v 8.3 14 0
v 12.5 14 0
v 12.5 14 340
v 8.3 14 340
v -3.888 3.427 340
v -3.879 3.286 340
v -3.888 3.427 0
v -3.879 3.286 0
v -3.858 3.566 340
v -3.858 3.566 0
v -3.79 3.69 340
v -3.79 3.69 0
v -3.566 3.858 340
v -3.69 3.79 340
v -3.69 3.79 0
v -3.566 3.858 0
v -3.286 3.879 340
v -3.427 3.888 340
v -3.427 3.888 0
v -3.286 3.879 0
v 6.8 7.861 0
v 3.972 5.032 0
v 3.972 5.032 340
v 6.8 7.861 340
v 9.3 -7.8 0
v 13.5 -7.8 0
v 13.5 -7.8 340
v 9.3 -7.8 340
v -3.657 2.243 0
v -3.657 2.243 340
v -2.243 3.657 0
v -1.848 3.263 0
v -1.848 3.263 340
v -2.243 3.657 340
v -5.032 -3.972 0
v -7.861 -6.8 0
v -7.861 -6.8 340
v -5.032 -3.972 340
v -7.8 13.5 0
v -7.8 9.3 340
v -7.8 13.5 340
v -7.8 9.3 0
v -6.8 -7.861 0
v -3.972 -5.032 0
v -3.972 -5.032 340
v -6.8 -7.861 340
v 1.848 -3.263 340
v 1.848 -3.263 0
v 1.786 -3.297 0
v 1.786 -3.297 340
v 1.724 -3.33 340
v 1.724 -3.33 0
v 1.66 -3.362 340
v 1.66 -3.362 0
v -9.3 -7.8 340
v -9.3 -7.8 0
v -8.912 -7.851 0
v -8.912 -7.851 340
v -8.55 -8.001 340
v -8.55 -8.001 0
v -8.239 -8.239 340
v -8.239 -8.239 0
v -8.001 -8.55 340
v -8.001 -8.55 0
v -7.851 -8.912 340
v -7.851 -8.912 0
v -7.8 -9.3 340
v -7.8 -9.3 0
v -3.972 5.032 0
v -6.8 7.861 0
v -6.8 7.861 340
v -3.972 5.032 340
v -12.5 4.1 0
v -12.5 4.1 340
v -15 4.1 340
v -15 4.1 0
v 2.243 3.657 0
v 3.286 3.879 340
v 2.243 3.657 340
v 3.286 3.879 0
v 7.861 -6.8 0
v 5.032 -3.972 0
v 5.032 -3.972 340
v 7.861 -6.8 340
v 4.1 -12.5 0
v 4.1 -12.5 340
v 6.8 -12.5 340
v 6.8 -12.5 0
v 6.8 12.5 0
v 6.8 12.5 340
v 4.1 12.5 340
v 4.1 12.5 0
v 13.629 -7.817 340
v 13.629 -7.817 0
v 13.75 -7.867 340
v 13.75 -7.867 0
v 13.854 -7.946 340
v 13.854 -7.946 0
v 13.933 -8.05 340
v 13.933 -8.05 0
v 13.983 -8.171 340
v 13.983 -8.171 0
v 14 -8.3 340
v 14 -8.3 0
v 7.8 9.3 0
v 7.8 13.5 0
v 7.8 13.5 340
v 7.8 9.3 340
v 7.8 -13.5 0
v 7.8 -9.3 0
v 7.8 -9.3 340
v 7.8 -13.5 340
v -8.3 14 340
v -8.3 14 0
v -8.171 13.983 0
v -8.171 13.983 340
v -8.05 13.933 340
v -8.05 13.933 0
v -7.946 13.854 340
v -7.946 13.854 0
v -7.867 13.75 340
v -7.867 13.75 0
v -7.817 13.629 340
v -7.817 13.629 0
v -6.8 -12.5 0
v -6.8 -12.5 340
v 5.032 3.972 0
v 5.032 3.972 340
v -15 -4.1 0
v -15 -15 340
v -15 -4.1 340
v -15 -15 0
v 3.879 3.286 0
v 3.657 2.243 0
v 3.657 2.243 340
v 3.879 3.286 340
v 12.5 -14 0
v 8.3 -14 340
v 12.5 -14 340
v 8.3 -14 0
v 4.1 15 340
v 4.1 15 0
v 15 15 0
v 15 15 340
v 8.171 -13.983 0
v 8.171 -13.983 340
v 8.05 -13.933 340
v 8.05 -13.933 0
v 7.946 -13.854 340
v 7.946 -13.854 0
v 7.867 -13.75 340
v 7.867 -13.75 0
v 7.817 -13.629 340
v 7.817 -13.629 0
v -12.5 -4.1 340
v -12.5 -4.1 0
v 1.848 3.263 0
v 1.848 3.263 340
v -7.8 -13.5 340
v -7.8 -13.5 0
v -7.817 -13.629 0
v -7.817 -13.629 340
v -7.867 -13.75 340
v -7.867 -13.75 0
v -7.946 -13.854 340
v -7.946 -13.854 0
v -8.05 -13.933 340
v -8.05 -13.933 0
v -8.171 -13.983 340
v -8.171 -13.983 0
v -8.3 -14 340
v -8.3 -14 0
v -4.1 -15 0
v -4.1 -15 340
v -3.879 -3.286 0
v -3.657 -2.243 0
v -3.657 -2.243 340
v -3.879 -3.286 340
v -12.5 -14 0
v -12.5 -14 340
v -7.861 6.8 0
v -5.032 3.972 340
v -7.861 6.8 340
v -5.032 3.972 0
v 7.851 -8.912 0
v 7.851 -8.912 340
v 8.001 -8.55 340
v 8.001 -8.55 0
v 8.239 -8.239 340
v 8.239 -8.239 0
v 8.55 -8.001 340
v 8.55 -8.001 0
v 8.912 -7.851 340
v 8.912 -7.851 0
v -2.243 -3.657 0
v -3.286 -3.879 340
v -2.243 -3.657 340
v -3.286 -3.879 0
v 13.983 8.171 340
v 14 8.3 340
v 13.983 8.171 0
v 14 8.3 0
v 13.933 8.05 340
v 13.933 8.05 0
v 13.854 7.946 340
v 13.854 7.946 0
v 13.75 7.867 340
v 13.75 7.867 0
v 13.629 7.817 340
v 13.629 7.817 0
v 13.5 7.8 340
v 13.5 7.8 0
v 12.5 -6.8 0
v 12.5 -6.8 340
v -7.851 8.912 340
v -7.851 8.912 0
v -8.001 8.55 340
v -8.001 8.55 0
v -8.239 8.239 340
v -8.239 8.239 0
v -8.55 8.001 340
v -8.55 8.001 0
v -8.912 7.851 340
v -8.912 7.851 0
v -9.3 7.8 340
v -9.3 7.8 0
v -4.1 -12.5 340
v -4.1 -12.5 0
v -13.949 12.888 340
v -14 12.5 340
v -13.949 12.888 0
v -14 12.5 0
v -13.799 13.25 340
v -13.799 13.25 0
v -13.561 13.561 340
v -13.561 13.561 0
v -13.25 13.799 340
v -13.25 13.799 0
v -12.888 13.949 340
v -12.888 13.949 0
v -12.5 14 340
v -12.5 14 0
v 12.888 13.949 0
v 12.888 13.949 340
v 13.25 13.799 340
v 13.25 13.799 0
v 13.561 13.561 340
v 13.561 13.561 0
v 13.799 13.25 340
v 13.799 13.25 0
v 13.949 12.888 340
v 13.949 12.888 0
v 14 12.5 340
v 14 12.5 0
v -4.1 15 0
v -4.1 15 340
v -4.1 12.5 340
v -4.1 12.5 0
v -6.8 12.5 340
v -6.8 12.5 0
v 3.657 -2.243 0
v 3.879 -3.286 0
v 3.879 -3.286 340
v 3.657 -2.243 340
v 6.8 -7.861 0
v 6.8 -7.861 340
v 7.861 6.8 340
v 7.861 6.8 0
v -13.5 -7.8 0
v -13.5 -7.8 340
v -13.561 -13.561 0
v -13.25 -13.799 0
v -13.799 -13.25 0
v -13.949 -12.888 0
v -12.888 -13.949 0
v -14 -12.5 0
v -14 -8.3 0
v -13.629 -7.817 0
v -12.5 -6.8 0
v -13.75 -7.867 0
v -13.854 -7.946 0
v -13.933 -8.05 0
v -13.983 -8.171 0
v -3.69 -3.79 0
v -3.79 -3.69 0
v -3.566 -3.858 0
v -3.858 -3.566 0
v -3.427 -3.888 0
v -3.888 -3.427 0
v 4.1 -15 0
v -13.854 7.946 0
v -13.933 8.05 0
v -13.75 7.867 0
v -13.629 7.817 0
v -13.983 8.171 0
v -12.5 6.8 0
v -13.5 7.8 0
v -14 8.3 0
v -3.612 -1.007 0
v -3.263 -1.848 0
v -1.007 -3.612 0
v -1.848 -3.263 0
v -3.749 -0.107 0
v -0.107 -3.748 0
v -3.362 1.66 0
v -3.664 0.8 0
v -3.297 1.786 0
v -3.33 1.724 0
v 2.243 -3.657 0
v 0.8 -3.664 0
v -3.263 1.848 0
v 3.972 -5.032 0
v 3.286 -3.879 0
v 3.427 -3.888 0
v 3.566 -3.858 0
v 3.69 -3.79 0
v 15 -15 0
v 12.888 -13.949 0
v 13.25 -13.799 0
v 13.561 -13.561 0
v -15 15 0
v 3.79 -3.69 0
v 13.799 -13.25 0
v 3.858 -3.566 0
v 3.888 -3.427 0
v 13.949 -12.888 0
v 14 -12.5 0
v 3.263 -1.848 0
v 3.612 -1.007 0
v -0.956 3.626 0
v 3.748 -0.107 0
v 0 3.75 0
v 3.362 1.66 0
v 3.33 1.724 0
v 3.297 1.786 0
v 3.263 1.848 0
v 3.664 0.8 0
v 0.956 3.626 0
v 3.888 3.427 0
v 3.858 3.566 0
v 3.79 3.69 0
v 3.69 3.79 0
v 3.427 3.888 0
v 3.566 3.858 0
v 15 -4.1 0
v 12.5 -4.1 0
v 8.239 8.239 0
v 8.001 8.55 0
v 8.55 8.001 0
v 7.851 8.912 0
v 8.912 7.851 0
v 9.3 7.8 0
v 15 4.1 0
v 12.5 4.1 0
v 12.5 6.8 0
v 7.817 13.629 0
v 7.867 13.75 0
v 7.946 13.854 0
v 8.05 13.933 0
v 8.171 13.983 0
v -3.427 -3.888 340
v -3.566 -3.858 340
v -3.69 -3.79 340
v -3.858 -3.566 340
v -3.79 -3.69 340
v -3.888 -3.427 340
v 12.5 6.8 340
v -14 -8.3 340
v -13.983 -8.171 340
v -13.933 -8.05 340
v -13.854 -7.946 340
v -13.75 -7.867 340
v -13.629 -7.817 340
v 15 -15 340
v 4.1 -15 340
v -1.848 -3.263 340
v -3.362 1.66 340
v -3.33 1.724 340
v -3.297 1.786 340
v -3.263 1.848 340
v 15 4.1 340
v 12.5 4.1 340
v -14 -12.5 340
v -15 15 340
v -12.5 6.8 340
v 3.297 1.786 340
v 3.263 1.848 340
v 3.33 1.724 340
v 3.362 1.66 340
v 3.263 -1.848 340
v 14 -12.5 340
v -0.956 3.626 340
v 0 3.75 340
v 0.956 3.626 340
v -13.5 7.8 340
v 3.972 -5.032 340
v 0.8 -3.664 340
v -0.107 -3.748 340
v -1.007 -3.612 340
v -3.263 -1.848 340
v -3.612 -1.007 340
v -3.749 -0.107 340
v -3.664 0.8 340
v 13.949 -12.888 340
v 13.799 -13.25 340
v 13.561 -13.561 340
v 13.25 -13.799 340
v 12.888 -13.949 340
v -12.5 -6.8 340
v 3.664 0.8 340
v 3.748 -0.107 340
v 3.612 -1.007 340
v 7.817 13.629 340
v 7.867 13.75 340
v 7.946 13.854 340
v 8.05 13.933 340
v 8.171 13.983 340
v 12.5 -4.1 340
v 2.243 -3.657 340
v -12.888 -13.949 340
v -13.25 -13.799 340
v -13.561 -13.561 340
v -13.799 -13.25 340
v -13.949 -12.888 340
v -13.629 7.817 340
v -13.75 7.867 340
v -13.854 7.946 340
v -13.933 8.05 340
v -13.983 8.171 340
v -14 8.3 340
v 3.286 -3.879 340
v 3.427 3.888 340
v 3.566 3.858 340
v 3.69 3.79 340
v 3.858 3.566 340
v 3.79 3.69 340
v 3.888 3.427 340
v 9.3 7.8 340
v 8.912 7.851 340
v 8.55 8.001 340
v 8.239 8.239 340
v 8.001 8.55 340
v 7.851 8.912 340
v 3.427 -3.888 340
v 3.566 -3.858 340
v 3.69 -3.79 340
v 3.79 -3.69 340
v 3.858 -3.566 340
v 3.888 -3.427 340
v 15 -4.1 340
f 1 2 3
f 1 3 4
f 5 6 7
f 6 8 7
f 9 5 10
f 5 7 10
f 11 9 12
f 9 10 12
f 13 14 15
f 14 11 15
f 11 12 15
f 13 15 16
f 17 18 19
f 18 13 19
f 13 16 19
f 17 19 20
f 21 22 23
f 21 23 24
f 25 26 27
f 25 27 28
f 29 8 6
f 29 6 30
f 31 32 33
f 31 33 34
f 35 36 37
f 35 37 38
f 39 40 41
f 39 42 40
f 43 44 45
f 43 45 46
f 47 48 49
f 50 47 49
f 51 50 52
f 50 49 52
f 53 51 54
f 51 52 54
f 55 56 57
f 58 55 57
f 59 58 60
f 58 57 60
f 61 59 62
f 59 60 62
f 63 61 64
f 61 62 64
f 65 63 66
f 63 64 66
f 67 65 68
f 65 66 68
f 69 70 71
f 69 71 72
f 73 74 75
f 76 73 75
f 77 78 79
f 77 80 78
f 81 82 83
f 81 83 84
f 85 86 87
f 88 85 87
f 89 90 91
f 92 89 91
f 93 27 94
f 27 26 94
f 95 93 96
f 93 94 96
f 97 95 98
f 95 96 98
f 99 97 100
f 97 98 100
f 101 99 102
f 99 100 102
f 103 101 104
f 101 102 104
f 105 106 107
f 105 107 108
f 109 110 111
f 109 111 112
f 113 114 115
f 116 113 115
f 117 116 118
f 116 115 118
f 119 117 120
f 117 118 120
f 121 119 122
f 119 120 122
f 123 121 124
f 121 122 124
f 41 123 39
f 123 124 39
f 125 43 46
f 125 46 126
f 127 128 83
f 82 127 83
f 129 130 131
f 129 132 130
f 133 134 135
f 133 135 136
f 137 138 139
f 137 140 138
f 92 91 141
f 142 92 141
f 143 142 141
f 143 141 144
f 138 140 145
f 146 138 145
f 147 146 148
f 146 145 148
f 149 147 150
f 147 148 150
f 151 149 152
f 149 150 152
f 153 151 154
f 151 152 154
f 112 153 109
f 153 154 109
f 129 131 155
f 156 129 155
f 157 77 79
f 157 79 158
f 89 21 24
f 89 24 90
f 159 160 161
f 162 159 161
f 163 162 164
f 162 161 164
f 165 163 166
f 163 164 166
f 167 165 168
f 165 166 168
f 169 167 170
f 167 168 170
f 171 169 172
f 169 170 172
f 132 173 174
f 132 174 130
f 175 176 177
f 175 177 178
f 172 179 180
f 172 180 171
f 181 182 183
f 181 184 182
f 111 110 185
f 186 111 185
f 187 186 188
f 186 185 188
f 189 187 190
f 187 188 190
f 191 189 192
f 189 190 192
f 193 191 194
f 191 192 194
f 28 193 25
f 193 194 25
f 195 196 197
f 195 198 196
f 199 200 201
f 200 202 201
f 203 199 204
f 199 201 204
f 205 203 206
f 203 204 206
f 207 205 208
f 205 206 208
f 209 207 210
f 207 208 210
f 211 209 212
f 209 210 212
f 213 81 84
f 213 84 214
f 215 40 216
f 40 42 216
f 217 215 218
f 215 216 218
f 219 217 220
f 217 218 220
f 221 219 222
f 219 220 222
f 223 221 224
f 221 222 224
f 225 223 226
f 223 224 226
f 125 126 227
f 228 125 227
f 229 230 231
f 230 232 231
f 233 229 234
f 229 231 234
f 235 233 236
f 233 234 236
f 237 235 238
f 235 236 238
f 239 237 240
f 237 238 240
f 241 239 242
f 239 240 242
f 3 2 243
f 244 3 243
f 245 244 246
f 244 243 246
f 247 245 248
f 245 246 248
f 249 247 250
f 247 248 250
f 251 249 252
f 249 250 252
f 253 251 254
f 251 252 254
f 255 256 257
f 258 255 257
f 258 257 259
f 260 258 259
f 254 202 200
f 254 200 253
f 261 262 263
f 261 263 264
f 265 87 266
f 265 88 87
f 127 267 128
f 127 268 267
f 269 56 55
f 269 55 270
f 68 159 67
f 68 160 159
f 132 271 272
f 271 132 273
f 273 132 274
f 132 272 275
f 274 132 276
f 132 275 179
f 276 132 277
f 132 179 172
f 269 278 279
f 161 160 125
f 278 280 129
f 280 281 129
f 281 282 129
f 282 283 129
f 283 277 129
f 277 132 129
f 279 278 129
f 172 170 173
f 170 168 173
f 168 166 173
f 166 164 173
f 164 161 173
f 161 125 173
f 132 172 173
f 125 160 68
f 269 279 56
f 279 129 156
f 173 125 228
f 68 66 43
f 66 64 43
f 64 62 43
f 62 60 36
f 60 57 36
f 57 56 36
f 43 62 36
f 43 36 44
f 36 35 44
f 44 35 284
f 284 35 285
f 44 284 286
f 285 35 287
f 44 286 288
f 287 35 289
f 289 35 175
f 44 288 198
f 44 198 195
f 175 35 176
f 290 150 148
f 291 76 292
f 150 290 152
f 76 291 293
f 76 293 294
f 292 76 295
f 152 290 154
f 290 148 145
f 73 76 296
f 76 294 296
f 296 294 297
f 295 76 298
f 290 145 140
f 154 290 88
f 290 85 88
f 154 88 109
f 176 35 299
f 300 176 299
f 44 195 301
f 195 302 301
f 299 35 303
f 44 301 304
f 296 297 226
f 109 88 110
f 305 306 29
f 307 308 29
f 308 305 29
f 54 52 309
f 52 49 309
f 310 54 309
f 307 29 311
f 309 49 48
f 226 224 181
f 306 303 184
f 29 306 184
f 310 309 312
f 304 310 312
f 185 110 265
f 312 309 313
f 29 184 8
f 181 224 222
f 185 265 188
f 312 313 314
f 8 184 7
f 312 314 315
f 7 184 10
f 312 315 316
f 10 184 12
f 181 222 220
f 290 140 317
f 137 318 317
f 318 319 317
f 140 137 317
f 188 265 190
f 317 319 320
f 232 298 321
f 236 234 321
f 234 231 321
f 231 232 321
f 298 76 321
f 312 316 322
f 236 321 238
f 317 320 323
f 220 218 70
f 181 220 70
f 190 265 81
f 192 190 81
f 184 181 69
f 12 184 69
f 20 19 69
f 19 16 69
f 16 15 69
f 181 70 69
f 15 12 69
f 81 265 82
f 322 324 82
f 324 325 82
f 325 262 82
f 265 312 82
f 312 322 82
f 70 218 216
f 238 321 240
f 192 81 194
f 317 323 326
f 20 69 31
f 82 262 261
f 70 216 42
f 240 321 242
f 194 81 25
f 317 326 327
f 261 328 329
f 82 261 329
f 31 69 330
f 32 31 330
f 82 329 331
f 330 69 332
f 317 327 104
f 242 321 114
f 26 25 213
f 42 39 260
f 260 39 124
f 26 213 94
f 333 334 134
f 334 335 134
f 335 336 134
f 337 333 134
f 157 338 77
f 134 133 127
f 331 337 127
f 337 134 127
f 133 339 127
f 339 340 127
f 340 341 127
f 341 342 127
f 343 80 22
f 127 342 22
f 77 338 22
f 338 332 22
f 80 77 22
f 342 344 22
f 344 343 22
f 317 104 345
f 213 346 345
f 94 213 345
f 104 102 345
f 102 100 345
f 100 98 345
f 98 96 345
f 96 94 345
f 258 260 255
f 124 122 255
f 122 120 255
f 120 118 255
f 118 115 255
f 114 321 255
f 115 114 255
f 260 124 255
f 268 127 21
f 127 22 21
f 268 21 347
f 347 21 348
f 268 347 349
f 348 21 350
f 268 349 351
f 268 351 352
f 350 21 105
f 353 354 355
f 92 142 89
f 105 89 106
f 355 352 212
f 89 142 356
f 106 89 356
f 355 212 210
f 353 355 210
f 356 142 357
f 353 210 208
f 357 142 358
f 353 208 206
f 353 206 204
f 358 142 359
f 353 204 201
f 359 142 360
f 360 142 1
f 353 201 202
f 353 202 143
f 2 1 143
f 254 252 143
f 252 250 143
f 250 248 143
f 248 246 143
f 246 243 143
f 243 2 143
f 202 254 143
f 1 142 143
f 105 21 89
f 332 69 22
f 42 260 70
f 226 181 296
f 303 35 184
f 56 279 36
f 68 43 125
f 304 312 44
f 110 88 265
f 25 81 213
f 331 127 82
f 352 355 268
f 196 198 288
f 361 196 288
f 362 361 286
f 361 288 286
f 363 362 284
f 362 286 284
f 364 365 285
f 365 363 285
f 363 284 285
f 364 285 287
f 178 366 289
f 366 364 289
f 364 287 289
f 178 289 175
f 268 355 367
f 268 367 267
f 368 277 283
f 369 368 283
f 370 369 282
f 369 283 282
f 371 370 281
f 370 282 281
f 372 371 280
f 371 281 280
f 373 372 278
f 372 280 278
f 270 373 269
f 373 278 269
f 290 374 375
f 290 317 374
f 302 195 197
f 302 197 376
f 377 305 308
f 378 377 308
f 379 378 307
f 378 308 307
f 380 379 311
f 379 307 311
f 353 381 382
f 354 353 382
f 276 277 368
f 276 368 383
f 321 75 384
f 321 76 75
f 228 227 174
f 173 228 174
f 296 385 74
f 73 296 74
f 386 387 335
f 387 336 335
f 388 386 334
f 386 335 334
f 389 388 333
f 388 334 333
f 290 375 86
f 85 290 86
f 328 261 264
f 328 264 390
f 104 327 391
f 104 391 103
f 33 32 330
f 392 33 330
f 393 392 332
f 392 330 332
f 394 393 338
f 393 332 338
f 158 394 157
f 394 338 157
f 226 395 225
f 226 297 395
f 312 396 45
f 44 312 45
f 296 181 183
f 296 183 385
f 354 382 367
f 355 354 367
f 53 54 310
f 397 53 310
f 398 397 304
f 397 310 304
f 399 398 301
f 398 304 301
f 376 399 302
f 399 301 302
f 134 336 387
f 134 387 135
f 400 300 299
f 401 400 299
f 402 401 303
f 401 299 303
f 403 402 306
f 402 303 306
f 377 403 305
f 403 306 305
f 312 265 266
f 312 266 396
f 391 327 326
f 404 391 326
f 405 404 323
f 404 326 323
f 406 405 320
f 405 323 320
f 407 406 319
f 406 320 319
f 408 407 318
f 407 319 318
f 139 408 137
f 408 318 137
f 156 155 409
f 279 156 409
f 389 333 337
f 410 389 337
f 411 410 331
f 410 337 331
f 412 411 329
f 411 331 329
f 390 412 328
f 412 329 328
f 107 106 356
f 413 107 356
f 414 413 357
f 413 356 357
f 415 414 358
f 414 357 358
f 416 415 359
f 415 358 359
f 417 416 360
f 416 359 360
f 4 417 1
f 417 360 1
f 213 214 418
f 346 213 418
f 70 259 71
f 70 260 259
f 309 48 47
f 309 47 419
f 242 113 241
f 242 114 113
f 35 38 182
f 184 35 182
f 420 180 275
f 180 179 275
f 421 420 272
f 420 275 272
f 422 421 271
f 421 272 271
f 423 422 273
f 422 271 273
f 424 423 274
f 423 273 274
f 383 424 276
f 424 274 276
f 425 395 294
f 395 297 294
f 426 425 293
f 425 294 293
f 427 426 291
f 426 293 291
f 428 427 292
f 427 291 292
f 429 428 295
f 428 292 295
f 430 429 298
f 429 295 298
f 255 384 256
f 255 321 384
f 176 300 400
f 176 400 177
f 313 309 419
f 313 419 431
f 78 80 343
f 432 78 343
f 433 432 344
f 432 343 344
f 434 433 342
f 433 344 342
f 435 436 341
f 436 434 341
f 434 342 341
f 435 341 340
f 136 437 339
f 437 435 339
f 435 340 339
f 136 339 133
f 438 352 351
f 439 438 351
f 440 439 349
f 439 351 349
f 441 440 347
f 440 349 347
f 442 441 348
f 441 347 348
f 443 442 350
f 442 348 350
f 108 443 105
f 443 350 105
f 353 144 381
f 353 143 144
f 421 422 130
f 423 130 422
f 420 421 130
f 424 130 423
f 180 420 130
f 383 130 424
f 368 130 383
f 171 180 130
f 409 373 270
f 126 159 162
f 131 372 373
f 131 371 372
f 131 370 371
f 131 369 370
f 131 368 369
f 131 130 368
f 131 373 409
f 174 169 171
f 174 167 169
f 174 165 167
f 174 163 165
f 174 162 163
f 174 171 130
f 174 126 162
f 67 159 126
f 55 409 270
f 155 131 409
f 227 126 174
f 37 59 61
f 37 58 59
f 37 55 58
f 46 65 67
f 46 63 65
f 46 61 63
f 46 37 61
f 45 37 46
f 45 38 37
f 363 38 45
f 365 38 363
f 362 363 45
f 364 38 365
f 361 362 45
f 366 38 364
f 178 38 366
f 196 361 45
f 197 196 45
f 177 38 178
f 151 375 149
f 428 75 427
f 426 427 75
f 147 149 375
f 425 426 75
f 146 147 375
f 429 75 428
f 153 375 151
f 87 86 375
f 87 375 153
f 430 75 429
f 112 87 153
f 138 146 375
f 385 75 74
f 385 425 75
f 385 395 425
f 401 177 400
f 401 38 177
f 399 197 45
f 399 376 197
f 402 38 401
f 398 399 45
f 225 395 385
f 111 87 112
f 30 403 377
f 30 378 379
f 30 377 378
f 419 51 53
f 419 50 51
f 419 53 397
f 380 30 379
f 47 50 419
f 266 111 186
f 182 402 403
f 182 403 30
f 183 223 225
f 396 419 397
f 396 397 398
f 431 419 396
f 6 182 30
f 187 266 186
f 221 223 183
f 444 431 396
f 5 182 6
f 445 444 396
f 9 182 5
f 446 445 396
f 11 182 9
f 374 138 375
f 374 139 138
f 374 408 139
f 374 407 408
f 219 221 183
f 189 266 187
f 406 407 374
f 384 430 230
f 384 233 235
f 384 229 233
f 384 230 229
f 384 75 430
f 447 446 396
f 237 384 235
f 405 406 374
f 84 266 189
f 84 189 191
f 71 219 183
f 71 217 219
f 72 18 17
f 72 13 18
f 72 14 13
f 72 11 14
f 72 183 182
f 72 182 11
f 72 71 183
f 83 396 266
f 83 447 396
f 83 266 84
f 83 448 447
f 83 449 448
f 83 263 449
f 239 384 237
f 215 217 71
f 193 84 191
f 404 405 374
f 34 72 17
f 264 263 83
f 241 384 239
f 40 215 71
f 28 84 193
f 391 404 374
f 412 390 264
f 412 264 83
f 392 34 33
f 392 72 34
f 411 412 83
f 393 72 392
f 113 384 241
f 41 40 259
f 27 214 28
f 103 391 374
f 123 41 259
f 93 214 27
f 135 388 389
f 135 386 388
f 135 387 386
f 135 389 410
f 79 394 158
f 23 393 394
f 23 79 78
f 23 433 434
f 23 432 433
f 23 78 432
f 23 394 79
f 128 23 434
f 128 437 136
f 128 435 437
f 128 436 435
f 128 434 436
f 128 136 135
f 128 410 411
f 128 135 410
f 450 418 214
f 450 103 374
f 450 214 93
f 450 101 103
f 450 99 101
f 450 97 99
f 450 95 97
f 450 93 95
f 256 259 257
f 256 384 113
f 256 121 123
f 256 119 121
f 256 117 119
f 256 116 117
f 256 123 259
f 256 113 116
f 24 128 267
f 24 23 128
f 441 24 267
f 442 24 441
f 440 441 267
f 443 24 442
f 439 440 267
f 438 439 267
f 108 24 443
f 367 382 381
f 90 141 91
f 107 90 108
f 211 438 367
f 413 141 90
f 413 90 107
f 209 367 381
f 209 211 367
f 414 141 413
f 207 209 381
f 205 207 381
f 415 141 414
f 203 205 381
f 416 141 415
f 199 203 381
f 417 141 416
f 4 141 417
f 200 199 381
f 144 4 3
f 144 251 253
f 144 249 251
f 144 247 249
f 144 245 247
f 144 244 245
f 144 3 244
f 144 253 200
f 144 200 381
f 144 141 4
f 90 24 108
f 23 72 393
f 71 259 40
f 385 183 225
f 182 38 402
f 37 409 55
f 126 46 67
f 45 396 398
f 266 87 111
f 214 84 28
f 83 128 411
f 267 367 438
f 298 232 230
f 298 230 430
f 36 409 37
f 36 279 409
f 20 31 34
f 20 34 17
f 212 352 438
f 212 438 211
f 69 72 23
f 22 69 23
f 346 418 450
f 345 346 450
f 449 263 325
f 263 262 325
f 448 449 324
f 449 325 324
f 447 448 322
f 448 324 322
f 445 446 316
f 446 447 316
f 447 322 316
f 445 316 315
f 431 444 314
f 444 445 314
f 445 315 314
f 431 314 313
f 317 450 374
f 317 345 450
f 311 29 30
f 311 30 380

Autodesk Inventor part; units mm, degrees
ref_plane "YZ Plane" through (0, 0, 0) normal (1, 0, 0) x (0, 1, 0)
ref_plane "XZ Plane" through (0, 0, 0) normal (0, 1, 0) x (-1, 0, 0)
ref_plane "XY Plane" through (0, 0, 0) normal (0, 0, 1) x (1, 0, 0)
sketch "Sketch1" plane through (0, 0, 0) normal (0, 0, 1) x (1, 0, 0)
  arc A0 (9.3, -7.8) -> (7.8, -9.3) centre (9.3, -9.3) ccw
  line L0 (13.5, -7.8) -> (9.3, -7.8)
  arc A1 (14, -8.3) -> (13.5, -7.8) centre (13.5, -8.3) ccw
  line L1 (14, -12.5) -> (14, -8.3)
  arc A2 (12.5, -14) -> (14, -12.5) centre (12.5, -12.5) ccw
  line L2 (8.3, -14) -> (12.5, -14)
  arc A3 (7.8, -13.5) -> (8.3, -14) centre (8.3, -13.5) ccw
  line L3 (7.8, -9.3) -> (7.8, -13.5)
  arc A4 (-13.5, -7.8) -> (-14, -8.3) centre (-13.5, -8.3) ccw
  line L4 (-9.3, -7.8) -> (-13.5, -7.8)
  arc A5 (-7.8, -9.3) -> (-9.3, -7.8) centre (-9.3, -9.3) ccw
  line L5 (-7.8, -13.5) -> (-7.8, -9.3)
  arc A6 (-8.3, -14) -> (-7.8, -13.5) centre (-8.3, -13.5) ccw
  line L6 (-12.5, -14) -> (-8.3, -14)
  arc A7 (-14, -12.5) -> (-12.5, -14) centre (-12.5, -12.5) ccw
  line L7 (-14, -8.3) -> (-14, -12.5)
  line L8 (3.2859, 3.8789) -> (2.2431, 3.6573)
  arc A8 (3.8789, 3.2859) -> (3.2859, 3.8789) centre (3.3898, 3.3898) ccw
  line L9 (3.6573, 2.2431) -> (3.8789, 3.2859)
  line L10 (3.2627, 1.8485) -> (3.6573, 2.2431)
  line L11 (3.6573, -2.2431) -> (3.2627, -1.8485)
  line L12 (3.8789, -3.2859) -> (3.6573, -2.2431)
  arc A9 (3.2859, -3.8789) -> (3.8789, -3.2859) centre (3.3898, -3.3898) ccw
  line L13 (2.2431, -3.6573) -> (3.2859, -3.8789)
  line L14 (1.8485, -3.2627) -> (2.2431, -3.6573)
  arc A10 (-1.8485, -3.2627) -> (1.6602, -3.3625) centre (0, 0) ccw
  line L15 (-2.2431, -3.6573) -> (-1.8485, -3.2627)
  line L16 (-3.2859, -3.8789) -> (-2.2431, -3.6573)
  arc A11 (-3.8789, -3.2859) -> (-3.2859, -3.8789) centre (-3.3898, -3.3898) ccw
  line L17 (-3.6573, -2.2431) -> (-3.8789, -3.2859)
  line L18 (-3.2627, -1.8485) -> (-3.6573, -2.2431)
  arc A12 (-3.3625, 1.6602) -> (-3.2627, -1.8485) centre (0, 0) ccw
  line L19 (-3.6573, 2.2431) -> (-3.2627, 1.8485)
  line L20 (-3.8789, 3.2859) -> (-3.6573, 2.2431)
  arc A13 (-3.2859, 3.8789) -> (-3.8789, 3.2859) centre (-3.3898, 3.3898) ccw
  line L21 (-2.2431, 3.6573) -> (-3.2859, 3.8789)
  line L22 (-1.8485, 3.2627) -> (-2.2431, 3.6573)
  line L23 (2.2431, 3.6573) -> (1.8485, 3.2627)
  arc A14 (13.5, 7.8) -> (14, 8.3) centre (13.5, 8.3) ccw
  line L24 (9.3, 7.8) -> (13.5, 7.8)
  arc A15 (7.8, 9.3) -> (9.3, 7.8) centre (9.3, 9.3) ccw
  line L25 (7.8, 13.5) -> (7.8, 9.3)
  arc A16 (8.3, 14) -> (7.8, 13.5) centre (8.3, 13.5) ccw
  line L26 (12.5, 14) -> (8.3, 14)
  arc A17 (14, 12.5) -> (12.5, 14) centre (12.5, 12.5) ccw
  line L27 (14, 8.3) -> (14, 12.5)
  arc A18 (-12.5, 14) -> (-14, 12.5) centre (-12.5, 12.5) ccw
  line L28 (-8.3, 14) -> (-12.5, 14)
  arc A19 (-7.8, 13.5) -> (-8.3, 14) centre (-8.3, 13.5) ccw
  line L29 (-7.8, 9.3) -> (-7.8, 13.5)
  arc A20 (-9.3, 7.8) -> (-7.8, 9.3) centre (-9.3, 9.3) ccw
  line L30 (-13.5, 7.8) -> (-9.3, 7.8)
  arc A21 (-14, 8.3) -> (-13.5, 7.8) centre (-13.5, 8.3) ccw
  line L31 (-14, 12.5) -> (-14, 8.3)
  line L32 (12.5, 4.1) -> (12.5, 6.8)
  line L33 (15, 4.1) -> (12.5, 4.1)
  line L34 (15, 15) -> (15, 4.1)
  line L35 (4.1, 15) -> (15, 15)
  line L36 (4.1, 12.5) -> (4.1, 15)
  line L37 (6.8, 12.5) -> (4.1, 12.5)
  line L38 (6.8, 7.8606) -> (6.8, 12.5)
  line L39 (3.9715, 5.0321) -> (6.8, 7.8606)
  line L40 (-3.9715, 5.0321) -> (3.9715, 5.0321)
  line L41 (-6.8, 7.8606) -> (-3.9715, 5.0321)
  line L42 (-6.8, 12.5) -> (-6.8, 7.8606)
  line L43 (-4.1, 12.5) -> (-6.8, 12.5)
  line L44 (-4.1, 15) -> (-4.1, 12.5)
  line L45 (-15, 15) -> (-4.1, 15)
  line L46 (-15, 4.1) -> (-15, 15)
  line L47 (-12.5, 4.1) -> (-15, 4.1)
  line L48 (-12.5, 6.8) -> (-12.5, 4.1)
  line L49 (-7.8606, 6.8) -> (-12.5, 6.8)
  line L50 (-5.0321, 3.9715) -> (-7.8606, 6.8)
  line L51 (-5.0321, -3.9715) -> (-5.0321, 3.9715)
  line L52 (-7.8606, -6.8) -> (-5.0321, -3.9715)
  line L53 (-12.5, -6.8) -> (-7.8606, -6.8)
  line L54 (-12.5, -4.1) -> (-12.5, -6.8)
  line L55 (-15, -4.1) -> (-12.5, -4.1)
  line L56 (-15, -15) -> (-15, -4.1)
  line L57 (-4.1, -15) -> (-15, -15)
  line L58 (-4.1, -12.5) -> (-4.1, -15)
  line L59 (-6.8, -12.5) -> (-4.1, -12.5)
  line L60 (-6.8, -7.8606) -> (-6.8, -12.5)
  line L61 (-3.9715, -5.0321) -> (-6.8, -7.8606)
  line L62 (3.9715, -5.0321) -> (-3.9715, -5.0321)
  line L63 (6.8, -7.8606) -> (3.9715, -5.0321)
  line L64 (6.8, -12.5) -> (6.8, -7.8606)
  line L65 (4.1, -12.5) -> (6.8, -12.5)
  line L66 (4.1, -15) -> (4.1, -12.5)
  line L67 (15, -15) -> (4.1, -15)
  line L68 (15, -4.1) -> (15, -15)
  line L69 (12.5, -4.1) -> (15, -4.1)
  line L70 (12.5, -6.8) -> (12.5, -4.1)
  line L71 (7.8606, -6.8) -> (12.5, -6.8)
  line L72 (5.0321, -3.9715) -> (7.8606, -6.8)
  line L73 (5.0321, 3.9715) -> (5.0321, -3.9715)
  line L74 (7.8606, 6.8) -> (5.0321, 3.9715)
  line L75 (12.5, 6.8) -> (7.8606, 6.8)
  arc A22 (-3.2627, 1.8485) -> (-3.3625, 1.6602) centre (0, 0) ccw
  arc A23 (3.3625, 1.6602) -> (3.2627, 1.8485) centre (0, 0) ccw
  arc A24 (1.8485, 3.2627) -> (-1.8485, 3.2627) centre (0, 0) ccw
  arc A25 (1.6602, -3.3625) -> (1.8485, -3.2627) centre (0, 0) ccw
  arc A26 (3.2627, -1.8485) -> (3.3625, 1.6602) centre (0, 0) ccw
extrude "Extrusion1" add sketch "Sketch1" along normal blind 340
properties part number "20.1068 30X30 -340" material "Aluminum-6061"
